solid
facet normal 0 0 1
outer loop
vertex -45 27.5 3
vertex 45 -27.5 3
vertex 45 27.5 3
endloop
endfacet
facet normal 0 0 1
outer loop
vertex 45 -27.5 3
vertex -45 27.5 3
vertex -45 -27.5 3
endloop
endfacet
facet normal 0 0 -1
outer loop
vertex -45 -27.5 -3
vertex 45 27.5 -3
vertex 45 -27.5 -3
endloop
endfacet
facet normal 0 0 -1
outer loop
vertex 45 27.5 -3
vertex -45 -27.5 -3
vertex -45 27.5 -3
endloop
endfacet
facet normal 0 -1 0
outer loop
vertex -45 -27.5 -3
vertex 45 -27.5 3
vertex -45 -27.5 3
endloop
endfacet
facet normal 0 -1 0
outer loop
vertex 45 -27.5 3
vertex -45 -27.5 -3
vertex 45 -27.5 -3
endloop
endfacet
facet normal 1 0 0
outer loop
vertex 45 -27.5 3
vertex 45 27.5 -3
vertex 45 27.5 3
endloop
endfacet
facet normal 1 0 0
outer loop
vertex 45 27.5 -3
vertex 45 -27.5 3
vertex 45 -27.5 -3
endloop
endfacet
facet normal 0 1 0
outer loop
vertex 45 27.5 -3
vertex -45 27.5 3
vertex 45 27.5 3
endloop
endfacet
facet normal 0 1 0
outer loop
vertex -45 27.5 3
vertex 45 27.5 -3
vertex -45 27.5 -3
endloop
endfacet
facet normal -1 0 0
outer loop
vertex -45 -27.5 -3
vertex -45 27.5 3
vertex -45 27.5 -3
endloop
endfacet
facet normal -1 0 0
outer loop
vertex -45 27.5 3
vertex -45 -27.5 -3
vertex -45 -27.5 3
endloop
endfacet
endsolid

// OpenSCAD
// ========================================
// a 90 x 55 x 6 mm plate
// NeuroCAD canonical IR; dimensions are millimetres
// ========================================
$fn = 48;

cube(size=[90, 55, 6], center=true);
